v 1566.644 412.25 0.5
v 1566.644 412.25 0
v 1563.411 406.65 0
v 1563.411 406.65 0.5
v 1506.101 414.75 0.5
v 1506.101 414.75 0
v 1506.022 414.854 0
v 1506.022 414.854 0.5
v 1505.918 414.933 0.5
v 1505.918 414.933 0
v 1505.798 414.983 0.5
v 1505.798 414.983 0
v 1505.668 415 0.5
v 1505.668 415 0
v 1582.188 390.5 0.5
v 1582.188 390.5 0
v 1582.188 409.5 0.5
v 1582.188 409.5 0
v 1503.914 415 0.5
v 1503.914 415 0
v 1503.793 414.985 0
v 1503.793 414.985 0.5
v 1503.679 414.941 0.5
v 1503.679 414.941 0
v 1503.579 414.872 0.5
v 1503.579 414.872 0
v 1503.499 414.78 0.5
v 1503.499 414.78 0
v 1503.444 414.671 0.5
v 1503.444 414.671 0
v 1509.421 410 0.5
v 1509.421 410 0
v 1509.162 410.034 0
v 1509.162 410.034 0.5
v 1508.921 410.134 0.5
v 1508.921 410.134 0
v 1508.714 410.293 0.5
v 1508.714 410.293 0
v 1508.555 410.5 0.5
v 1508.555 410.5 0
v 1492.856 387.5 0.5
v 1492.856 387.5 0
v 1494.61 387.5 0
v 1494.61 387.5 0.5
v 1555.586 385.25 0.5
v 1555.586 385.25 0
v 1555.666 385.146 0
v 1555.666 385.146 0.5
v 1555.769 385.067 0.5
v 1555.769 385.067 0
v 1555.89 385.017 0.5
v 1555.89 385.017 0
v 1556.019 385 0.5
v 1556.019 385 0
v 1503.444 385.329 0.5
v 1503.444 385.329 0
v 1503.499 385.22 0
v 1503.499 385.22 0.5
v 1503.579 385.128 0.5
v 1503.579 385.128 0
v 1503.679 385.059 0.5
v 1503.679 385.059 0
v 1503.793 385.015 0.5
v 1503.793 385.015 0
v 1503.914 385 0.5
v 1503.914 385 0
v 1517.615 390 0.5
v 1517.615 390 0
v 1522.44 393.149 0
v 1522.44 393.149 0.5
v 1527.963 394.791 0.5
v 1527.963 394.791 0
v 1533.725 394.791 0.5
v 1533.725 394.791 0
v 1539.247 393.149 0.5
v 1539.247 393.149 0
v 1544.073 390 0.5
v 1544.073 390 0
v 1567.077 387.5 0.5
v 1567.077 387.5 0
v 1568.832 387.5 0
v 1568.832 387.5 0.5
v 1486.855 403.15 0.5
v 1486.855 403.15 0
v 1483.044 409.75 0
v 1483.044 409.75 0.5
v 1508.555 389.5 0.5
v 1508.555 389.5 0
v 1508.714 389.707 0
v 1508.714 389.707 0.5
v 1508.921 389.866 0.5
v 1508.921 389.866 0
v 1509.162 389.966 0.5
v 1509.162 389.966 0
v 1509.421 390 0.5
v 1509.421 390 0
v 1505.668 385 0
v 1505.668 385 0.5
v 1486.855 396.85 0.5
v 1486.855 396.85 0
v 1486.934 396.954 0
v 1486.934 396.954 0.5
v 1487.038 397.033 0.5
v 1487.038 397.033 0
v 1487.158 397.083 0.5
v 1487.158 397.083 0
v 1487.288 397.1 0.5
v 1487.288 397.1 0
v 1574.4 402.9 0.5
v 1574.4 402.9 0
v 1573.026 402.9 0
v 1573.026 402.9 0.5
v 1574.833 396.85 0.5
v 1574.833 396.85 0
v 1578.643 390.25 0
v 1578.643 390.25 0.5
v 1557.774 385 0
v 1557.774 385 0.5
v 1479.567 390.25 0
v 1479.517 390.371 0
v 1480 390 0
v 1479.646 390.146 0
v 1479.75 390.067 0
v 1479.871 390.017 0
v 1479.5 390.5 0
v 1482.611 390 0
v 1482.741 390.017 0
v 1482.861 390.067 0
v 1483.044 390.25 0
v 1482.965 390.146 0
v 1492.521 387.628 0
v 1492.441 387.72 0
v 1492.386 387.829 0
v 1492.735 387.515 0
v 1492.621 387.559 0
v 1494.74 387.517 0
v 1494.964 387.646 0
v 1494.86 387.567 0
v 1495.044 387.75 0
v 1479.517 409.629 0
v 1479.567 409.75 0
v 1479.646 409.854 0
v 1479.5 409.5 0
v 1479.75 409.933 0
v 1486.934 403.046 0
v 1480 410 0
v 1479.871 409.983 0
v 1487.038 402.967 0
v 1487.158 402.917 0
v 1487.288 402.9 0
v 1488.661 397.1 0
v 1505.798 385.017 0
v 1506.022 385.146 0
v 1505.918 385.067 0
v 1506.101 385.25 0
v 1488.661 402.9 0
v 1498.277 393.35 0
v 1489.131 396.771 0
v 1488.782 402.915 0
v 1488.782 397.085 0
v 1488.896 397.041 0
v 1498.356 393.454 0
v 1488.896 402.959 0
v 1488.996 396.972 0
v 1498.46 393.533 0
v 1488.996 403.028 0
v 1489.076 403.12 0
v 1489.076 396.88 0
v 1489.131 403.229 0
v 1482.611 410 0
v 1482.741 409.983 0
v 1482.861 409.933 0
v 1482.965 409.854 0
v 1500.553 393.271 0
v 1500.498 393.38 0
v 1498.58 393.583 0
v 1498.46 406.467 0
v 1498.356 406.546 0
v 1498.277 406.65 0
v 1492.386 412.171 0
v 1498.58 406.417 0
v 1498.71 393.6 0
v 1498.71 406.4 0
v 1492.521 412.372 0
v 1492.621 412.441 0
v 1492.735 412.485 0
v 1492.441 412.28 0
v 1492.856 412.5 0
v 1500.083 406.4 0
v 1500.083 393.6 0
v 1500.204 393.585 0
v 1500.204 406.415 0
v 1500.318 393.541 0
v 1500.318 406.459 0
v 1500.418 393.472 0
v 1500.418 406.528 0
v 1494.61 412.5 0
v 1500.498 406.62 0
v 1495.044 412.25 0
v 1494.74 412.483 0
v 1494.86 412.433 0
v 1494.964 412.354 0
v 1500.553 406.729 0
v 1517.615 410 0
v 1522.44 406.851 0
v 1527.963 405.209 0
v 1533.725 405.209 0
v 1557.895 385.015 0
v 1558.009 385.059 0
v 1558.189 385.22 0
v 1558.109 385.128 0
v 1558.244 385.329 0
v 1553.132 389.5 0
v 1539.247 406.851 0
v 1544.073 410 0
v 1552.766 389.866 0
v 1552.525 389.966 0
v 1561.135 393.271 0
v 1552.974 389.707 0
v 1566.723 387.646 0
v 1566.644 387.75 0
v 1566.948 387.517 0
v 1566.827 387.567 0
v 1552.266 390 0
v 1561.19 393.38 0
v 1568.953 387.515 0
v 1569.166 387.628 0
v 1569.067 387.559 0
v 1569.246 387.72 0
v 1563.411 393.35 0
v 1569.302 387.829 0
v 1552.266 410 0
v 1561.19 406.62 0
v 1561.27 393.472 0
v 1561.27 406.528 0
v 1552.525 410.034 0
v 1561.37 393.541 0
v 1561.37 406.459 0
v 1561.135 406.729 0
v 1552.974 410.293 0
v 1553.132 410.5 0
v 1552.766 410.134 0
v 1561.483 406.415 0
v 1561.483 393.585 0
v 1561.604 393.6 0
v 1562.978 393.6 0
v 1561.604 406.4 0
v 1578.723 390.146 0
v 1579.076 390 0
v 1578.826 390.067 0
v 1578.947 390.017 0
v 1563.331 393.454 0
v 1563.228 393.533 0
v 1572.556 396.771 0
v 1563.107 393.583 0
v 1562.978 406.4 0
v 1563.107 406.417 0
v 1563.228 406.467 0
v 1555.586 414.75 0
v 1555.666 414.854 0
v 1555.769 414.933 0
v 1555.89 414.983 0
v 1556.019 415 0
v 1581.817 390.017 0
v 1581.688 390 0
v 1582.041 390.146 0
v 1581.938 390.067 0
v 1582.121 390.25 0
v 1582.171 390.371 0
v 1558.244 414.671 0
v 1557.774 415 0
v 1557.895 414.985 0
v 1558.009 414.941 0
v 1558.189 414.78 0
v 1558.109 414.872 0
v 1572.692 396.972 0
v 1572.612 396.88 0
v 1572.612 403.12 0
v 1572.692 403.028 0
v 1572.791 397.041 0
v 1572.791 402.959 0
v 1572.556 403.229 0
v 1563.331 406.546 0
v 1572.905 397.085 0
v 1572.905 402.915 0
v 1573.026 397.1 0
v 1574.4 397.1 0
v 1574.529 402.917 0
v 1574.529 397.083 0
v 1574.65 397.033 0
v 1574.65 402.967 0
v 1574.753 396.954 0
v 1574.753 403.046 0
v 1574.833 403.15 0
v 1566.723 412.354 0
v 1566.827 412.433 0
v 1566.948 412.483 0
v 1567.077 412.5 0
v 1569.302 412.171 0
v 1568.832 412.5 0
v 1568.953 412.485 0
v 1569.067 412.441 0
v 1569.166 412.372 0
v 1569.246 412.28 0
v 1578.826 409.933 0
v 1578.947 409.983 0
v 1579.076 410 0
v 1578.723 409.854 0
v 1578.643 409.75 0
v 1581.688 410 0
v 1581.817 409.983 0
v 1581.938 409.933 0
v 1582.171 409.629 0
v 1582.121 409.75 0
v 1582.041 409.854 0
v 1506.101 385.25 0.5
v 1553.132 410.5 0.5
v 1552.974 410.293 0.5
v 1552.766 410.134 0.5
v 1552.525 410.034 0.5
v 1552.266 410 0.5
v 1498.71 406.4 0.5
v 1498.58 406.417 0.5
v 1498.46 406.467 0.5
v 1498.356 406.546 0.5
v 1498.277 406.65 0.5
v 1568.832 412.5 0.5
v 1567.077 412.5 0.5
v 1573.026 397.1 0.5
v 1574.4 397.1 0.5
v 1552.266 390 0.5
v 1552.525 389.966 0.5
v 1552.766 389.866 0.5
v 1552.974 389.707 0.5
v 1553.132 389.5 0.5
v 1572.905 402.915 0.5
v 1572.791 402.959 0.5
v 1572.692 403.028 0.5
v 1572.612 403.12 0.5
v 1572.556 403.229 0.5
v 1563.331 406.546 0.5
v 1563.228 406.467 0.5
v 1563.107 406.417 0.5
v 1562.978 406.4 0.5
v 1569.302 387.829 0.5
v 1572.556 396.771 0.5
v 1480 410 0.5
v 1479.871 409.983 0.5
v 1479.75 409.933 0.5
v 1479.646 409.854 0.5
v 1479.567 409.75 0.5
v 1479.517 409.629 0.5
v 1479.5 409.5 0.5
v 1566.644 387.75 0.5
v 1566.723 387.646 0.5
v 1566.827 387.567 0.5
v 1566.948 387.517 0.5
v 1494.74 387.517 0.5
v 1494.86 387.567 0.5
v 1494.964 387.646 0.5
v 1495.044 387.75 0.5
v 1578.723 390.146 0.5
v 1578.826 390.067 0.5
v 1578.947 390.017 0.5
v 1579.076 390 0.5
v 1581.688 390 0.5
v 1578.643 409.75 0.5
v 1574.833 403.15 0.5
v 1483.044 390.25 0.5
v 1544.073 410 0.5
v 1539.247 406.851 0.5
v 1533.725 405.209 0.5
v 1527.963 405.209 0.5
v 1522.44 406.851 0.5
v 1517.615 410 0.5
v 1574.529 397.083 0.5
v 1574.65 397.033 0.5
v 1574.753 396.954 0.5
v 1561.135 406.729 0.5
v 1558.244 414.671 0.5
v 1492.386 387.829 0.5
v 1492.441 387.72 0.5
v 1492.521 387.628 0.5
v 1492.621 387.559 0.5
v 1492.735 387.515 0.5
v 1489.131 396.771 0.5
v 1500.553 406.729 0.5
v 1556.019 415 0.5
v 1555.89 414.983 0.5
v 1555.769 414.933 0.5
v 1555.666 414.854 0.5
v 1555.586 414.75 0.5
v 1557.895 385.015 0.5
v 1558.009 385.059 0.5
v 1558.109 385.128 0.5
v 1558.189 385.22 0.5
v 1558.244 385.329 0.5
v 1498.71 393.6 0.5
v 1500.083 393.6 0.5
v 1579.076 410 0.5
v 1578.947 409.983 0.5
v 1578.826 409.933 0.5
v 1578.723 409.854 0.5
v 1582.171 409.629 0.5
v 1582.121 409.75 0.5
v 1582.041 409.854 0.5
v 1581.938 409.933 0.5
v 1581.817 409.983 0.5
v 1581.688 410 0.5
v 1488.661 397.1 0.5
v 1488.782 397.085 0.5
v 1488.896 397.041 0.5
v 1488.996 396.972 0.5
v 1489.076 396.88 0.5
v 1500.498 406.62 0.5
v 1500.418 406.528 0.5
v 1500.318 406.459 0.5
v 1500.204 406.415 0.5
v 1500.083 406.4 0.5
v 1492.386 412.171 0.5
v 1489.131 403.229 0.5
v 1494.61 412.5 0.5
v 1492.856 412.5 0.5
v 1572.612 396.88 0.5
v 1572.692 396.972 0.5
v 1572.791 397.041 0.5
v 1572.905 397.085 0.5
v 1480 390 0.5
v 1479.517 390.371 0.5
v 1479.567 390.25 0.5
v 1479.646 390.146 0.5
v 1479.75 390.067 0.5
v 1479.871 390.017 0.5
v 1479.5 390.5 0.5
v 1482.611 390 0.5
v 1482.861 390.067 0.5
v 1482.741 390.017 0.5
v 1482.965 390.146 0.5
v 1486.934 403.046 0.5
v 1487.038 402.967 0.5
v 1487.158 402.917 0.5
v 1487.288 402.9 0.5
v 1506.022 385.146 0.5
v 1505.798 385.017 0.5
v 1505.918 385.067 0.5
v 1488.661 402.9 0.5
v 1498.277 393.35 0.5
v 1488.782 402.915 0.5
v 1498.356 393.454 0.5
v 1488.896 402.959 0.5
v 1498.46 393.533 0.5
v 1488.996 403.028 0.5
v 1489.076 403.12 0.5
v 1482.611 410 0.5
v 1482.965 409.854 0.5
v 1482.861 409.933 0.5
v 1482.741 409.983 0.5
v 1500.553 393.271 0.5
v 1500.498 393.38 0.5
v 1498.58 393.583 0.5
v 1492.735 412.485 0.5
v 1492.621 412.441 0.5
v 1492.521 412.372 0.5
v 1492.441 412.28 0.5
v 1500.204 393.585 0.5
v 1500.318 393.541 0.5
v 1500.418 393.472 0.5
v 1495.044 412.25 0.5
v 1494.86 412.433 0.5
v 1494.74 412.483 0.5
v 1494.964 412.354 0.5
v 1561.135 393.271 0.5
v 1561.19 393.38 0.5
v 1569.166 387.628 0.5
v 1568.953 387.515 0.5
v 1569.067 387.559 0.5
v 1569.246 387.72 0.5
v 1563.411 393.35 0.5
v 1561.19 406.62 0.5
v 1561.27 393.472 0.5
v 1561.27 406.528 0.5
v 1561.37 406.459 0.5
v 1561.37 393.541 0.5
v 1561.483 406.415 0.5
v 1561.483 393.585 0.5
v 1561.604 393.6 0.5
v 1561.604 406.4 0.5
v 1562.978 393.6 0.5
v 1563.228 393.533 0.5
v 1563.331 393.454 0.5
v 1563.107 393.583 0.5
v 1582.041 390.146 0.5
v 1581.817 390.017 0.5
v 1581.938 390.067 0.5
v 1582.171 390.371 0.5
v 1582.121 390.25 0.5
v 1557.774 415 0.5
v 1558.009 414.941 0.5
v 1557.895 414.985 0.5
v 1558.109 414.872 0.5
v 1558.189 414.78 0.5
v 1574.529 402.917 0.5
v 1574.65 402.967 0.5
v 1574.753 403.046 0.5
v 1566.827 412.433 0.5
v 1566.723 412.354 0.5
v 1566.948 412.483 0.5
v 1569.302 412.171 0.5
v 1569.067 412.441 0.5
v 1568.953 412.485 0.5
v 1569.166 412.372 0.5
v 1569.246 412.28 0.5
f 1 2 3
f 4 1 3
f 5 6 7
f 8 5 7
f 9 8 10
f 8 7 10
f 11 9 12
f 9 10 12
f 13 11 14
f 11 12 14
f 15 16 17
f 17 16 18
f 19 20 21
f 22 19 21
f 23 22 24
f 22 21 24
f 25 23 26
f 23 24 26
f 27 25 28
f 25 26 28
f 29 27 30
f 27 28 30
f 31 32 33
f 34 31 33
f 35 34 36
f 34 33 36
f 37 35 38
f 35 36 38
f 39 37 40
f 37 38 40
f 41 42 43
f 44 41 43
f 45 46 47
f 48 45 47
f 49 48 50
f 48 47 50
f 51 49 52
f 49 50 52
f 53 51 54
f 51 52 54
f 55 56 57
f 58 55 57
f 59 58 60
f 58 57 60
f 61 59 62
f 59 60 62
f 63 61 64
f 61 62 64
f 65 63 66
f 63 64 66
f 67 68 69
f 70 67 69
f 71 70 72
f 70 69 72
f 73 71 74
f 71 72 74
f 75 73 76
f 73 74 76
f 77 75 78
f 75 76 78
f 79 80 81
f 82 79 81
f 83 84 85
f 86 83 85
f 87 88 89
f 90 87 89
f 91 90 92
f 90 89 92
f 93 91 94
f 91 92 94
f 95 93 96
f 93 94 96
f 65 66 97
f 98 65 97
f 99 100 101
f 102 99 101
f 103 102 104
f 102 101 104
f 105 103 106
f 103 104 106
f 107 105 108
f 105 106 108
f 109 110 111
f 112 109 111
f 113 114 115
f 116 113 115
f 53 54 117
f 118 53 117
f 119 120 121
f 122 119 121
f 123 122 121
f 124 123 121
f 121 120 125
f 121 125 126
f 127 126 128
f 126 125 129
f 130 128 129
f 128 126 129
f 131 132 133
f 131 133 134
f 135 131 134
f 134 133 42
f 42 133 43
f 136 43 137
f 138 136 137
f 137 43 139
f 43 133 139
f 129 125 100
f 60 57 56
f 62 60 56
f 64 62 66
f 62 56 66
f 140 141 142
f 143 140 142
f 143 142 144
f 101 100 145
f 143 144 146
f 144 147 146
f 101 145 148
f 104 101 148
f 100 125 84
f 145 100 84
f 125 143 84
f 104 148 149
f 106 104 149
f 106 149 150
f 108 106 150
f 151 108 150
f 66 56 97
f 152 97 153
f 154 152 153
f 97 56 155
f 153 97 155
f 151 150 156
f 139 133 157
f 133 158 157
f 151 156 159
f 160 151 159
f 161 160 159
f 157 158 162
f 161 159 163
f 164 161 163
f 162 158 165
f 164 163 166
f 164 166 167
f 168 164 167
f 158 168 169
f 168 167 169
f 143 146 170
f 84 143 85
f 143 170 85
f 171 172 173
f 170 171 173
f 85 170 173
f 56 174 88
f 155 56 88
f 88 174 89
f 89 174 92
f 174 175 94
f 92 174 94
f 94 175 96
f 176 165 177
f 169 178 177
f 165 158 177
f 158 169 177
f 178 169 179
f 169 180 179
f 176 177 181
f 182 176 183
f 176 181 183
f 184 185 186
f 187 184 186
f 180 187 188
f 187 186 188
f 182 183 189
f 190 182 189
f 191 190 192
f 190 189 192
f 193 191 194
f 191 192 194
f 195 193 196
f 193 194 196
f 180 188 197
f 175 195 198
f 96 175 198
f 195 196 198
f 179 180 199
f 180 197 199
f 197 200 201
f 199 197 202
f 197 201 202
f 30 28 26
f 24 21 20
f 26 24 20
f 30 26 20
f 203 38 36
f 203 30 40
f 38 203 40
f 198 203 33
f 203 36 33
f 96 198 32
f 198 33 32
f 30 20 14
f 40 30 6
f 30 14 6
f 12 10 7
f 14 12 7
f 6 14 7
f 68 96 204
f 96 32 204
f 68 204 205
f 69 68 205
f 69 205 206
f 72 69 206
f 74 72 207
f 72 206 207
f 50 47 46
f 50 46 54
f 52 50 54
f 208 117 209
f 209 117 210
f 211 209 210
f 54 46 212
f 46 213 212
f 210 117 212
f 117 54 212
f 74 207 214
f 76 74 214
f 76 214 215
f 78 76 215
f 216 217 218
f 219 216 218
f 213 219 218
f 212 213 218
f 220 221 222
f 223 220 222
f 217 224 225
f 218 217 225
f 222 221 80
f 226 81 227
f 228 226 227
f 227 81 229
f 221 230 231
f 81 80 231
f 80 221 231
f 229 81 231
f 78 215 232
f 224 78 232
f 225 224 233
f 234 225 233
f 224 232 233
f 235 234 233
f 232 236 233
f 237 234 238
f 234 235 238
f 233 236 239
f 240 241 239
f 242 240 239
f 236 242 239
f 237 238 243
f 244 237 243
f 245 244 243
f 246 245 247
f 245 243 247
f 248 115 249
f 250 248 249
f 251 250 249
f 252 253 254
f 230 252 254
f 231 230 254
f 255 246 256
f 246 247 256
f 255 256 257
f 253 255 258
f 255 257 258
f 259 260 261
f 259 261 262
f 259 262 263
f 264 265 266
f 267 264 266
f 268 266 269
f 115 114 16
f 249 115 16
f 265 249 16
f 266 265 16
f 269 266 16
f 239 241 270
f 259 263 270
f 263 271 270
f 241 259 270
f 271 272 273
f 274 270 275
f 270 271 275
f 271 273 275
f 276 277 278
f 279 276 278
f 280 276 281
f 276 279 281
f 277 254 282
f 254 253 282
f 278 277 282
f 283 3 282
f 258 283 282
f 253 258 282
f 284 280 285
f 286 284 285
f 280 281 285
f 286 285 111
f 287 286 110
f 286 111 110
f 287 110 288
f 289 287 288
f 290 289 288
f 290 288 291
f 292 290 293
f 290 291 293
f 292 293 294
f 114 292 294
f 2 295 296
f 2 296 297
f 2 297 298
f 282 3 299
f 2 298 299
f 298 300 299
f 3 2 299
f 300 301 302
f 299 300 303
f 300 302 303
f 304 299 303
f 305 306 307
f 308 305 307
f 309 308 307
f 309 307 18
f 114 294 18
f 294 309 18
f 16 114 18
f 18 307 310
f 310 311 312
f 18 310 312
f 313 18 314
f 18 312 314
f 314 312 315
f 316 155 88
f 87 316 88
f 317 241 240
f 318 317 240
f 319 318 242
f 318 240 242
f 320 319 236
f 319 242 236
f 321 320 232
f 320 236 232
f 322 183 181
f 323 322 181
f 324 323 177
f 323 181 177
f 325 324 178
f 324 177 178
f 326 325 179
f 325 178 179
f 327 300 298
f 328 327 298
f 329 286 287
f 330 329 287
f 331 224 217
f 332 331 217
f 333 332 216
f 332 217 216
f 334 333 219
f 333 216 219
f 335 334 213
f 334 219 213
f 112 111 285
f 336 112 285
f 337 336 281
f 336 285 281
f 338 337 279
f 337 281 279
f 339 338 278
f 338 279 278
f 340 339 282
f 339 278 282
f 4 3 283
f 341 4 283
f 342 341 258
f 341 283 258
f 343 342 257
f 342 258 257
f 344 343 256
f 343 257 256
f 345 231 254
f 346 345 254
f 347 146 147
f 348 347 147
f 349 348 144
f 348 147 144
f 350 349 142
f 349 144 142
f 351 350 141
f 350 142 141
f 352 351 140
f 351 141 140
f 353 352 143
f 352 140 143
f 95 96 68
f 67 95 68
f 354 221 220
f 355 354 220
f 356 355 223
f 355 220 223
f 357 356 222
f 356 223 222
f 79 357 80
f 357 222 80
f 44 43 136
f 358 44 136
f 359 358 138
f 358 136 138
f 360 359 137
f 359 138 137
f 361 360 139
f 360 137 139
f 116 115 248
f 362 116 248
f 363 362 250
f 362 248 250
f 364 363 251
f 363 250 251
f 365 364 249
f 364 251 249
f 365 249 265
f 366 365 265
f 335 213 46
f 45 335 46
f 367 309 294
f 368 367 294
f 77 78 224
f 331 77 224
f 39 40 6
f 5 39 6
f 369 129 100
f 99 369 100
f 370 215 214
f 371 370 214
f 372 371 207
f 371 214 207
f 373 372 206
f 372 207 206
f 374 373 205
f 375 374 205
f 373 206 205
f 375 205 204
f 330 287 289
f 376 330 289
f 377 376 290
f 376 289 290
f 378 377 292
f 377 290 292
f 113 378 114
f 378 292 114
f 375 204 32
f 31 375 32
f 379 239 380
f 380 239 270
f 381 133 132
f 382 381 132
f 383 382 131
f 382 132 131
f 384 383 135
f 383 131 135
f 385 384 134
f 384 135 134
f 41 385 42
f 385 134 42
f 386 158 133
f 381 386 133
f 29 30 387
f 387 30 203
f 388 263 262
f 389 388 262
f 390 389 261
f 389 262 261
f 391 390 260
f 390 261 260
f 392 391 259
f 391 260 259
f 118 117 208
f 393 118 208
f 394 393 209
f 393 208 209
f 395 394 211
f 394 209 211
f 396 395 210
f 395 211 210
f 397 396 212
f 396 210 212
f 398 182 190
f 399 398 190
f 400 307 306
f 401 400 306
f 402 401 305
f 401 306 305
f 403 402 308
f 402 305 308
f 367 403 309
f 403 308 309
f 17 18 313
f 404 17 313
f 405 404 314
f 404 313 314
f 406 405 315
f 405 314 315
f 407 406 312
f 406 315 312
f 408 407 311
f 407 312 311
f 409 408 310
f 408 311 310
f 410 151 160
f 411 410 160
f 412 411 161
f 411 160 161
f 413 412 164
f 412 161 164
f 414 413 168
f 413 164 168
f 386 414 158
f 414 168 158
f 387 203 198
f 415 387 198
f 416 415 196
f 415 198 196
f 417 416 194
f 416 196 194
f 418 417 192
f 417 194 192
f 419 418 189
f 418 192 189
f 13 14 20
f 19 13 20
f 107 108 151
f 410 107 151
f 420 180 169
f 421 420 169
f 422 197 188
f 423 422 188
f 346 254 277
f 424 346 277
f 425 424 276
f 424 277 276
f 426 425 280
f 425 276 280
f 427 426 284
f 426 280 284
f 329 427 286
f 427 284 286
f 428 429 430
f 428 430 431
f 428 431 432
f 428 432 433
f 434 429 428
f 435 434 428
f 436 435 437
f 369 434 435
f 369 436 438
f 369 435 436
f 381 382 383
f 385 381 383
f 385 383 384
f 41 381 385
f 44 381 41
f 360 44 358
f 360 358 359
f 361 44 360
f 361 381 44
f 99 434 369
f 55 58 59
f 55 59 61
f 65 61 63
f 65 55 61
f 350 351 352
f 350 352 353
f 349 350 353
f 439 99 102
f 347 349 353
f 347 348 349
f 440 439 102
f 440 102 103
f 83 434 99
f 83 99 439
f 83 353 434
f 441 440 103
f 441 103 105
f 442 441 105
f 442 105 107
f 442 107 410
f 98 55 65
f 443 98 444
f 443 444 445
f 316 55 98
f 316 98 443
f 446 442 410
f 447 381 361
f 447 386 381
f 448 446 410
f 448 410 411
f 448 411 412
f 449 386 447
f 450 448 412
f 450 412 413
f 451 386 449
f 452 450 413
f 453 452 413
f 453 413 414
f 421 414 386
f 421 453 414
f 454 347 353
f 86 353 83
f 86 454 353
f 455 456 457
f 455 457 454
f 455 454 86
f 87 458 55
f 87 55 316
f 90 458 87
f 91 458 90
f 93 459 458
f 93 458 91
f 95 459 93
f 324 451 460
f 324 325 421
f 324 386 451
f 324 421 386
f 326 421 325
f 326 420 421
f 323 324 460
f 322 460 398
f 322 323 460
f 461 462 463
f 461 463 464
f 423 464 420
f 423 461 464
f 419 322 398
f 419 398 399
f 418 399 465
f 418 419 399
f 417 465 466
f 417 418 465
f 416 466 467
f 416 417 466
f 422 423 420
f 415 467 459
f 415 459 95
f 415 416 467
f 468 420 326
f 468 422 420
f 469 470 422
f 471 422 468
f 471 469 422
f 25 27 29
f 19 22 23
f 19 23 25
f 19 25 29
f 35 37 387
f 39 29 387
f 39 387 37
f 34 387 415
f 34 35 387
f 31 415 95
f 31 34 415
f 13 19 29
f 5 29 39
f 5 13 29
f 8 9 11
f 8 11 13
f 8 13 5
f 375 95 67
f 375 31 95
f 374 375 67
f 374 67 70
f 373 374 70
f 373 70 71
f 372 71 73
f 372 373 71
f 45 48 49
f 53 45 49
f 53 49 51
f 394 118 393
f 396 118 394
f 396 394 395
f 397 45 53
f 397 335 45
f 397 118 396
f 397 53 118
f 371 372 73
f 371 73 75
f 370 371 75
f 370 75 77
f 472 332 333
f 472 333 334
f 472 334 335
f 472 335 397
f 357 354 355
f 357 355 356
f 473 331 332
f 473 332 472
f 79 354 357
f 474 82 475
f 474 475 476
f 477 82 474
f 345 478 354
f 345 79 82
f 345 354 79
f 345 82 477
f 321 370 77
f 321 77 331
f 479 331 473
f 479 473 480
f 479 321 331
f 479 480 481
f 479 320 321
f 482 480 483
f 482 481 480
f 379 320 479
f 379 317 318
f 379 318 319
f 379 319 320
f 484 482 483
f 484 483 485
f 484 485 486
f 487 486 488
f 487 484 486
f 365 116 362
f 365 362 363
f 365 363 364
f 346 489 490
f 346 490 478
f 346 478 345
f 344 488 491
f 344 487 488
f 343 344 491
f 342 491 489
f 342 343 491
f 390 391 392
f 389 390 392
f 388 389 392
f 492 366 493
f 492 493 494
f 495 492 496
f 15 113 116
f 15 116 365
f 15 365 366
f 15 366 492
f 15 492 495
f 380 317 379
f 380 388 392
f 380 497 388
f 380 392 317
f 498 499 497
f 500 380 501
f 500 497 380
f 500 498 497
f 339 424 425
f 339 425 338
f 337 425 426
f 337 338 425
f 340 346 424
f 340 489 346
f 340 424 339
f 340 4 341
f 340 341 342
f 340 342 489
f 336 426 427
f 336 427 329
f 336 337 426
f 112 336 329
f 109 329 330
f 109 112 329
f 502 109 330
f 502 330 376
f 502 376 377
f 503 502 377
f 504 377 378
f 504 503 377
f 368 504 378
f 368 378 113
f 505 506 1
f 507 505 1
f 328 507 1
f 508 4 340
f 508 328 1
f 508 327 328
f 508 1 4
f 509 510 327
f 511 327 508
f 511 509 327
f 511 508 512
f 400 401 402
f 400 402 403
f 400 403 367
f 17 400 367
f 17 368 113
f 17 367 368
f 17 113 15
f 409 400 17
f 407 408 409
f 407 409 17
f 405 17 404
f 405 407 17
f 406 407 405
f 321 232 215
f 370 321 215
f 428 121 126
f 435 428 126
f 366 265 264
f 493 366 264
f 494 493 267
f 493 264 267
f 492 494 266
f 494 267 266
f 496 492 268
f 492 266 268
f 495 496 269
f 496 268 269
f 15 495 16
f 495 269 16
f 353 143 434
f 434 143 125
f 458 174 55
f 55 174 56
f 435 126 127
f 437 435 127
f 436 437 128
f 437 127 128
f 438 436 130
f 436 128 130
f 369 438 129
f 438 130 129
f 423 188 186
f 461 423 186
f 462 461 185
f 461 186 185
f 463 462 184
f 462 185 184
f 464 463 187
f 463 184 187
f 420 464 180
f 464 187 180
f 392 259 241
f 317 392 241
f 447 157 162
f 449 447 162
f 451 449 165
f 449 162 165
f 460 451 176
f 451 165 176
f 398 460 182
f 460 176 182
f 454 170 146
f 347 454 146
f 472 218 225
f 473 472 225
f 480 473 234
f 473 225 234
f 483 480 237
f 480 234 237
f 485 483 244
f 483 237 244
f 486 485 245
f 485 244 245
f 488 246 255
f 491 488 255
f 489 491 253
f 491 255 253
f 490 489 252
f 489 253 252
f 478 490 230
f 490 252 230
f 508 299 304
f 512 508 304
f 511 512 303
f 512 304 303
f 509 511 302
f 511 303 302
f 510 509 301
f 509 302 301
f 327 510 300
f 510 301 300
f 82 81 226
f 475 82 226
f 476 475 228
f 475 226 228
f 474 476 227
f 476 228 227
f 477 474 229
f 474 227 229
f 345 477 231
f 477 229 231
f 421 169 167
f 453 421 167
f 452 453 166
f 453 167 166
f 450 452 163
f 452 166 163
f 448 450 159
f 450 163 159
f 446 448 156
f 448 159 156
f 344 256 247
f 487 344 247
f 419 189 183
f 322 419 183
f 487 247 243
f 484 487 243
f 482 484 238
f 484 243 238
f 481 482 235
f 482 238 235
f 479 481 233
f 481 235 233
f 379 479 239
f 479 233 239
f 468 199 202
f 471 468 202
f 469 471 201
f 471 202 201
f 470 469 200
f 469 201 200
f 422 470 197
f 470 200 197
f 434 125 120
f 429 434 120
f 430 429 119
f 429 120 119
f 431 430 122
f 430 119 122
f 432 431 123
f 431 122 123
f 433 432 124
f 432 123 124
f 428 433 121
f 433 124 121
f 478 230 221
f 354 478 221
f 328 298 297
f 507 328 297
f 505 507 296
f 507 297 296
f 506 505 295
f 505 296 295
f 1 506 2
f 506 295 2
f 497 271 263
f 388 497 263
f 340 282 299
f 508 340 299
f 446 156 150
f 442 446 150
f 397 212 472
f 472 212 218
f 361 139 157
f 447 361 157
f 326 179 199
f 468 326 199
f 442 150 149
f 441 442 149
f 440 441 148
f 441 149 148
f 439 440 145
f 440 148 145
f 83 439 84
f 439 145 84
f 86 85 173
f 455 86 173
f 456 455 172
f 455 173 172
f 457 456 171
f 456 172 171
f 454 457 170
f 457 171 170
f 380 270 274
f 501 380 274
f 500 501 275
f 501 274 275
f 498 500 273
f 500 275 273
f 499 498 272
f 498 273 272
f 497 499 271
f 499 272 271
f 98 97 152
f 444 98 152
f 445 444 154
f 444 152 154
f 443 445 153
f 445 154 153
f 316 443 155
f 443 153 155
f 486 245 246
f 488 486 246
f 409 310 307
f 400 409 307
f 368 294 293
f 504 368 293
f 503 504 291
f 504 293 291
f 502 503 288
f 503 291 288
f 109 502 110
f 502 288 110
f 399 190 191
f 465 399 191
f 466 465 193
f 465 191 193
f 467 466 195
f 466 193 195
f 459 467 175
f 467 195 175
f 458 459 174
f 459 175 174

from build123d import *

# Parameters (mm, degrees)
BOSS_EXTRUDE1_DEPTH = 0.5


with BuildPart() as part:
    # Model → Boss-Extrude1 (new body)
    with BuildSketch(Plane.XY):
        with BuildLine():
            Line((1561.604350415, 393.6), (1562.977857238, 393.6))
            ThreePointArc((1562.977857238, 393.6), (1563.227857238, 393.533012702), (1563.41086994, 393.35))
            Line((1563.41086994, 393.35), (1566.644031447, 387.75))
            ThreePointArc((1566.644031447, 387.75), (1566.827044149, 387.566987298), (1567.077044149, 387.5))
            Line((1567.077044149, 387.5), (1568.831847468, 387.5))
            ThreePointArc((1568.831847468, 387.5), (1569.118635686, 387.590423978), (1569.301693779, 387.828989928))
            Line((1569.301693779, 387.828989928), (1572.556322945, 396.771010072))
            ThreePointArc((1572.556322945, 396.771010072), (1572.739381037, 397.009576022), (1573.026169255, 397.1))
            Line((1573.026169255, 397.1), (1574.399676079, 397.1))
            ThreePointArc((1574.399676079, 397.1), (1574.649676079, 397.033012702), (1574.83268878, 396.85))
            Line((1574.83268878, 396.85), (1578.643200557, 390.25))
            ThreePointArc((1578.643200557, 390.25), (1578.826213259, 390.066987298), (1579.076213259, 390))
            Line((1579.076213259, 390), (1581.687538124, 390))
            ThreePointArc((1581.687538124, 390), (1582.041091515, 390.146446609), (1582.187538124, 390.5))
            Line((1582.187538124, 390.5), (1582.187538124, 409.5))
            ThreePointArc((1582.187538124, 409.5), (1582.041091515, 409.853553391), (1581.687538124, 410))
            Line((1581.687538124, 410), (1579.076213259, 410))
            ThreePointArc((1579.076213259, 410), (1578.826213259, 409.933012702), (1578.643200557, 409.75))
            Line((1578.643200557, 409.75), (1574.83268878, 403.15))
            ThreePointArc((1574.83268878, 403.15), (1574.649676079, 402.966987298), (1574.399676079, 402.9))
            Line((1574.399676079, 402.9), (1573.026169255, 402.9))
            ThreePointArc((1573.026169255, 402.9), (1572.739381037, 402.990423978), (1572.556322945, 403.228989928))
            Line((1572.556322945, 403.228989928), (1569.301693779, 412.171010072))
            ThreePointArc((1569.301693779, 412.171010072), (1569.118635686, 412.409576022), (1568.831847468, 412.5))
            Line((1568.831847468, 412.5), (1567.077044149, 412.5))
            ThreePointArc((1567.077044149, 412.5), (1566.827044149, 412.433012702), (1566.644031447, 412.25))
            Line((1566.644031447, 412.25), (1563.41086994, 406.65))
            ThreePointArc((1563.41086994, 406.65), (1563.227857238, 406.466987298), (1562.977857238, 406.4))
            Line((1562.977857238, 406.4), (1561.604350415, 406.4))
            ThreePointArc((1561.604350415, 406.4), (1561.317562197, 406.490423978), (1561.134504104, 406.728989928))
            Line((1561.134504104, 406.728989928), (1558.243845172, 414.671010072))
            ThreePointArc((1558.243845172, 414.671010072), (1558.06078708, 414.909576022), (1557.773998862, 415))
            Line((1557.773998862, 415), (1556.019195543, 415))
            ThreePointArc((1556.019195543, 415), (1555.769195543, 414.933012702), (1555.586182841, 414.75))
            Line((1555.586182841, 414.75), (1553.132444197, 410.5))
            ThreePointArc((1553.132444197, 410.5), (1552.766418793, 410.133974596), (1552.266418793, 410))
            Line((1552.266418793, 410), (1544.072525617, 410))
            ThreePointArc((1544.072525617, 410), (1530.843769062, 405), (1517.615012507, 410))
            Line((1517.615012507, 410), (1509.421119331, 410))
            ThreePointArc((1509.421119331, 410), (1508.921119331, 410.133974596), (1508.555093928, 410.5))
            Line((1508.555093928, 410.5), (1506.101355284, 414.75))
            ThreePointArc((1506.101355284, 414.75), (1505.918342582, 414.933012702), (1505.668342582, 415))
            Line((1505.668342582, 415), (1503.913539263, 415))
            ThreePointArc((1503.913539263, 415), (1503.626751044, 414.909576022), (1503.443692952, 414.671010072))
            Line((1503.443692952, 414.671010072), (1500.55303402, 406.728989928))
            ThreePointArc((1500.55303402, 406.728989928), (1500.369975928, 406.490423978), (1500.08318771, 406.4))
            Line((1500.08318771, 406.4), (1498.709680887, 406.4))
            ThreePointArc((1498.709680887, 406.4), (1498.459680886, 406.466987298), (1498.276668185, 406.65))
            Line((1498.276668185, 406.65), (1495.043506677, 412.25))
            ThreePointArc((1495.043506677, 412.25), (1494.860493975, 412.433012702), (1494.610493975, 412.5))
            Line((1494.610493975, 412.5), (1492.855690656, 412.5))
            ThreePointArc((1492.855690656, 412.5), (1492.568902438, 412.409576022), (1492.385844346, 412.171010072))
            Line((1492.385844346, 412.171010072), (1489.131215179, 403.228989928))
            ThreePointArc((1489.131215179, 403.228989928), (1488.948157087, 402.990423978), (1488.661368869, 402.9))
            Line((1488.661368869, 402.9), (1487.287862046, 402.9))
            ThreePointArc((1487.287862046, 402.9), (1487.037862046, 402.966987298), (1486.854849344, 403.15))
            Line((1486.854849344, 403.15), (1483.044337567, 409.75))
            ThreePointArc((1483.044337567, 409.75), (1482.861324865, 409.933012702), (1482.611324865, 410))
            Line((1482.611324865, 410), (1480, 410))
            ThreePointArc((1480, 410), (1479.646446609, 409.853553391), (1479.5, 409.5))
            Line((1479.5, 409.5), (1479.5, 390.5))
            ThreePointArc((1479.5, 390.5), (1479.646446609, 390.146446609), (1480, 390))
            Line((1480, 390), (1482.611324865, 390))
            ThreePointArc((1482.611324865, 390), (1482.861324865, 390.066987298), (1483.044337567, 390.25))
            Line((1483.044337567, 390.25), (1486.854849344, 396.85))
            ThreePointArc((1486.854849344, 396.85), (1487.037862046, 397.033012702), (1487.287862046, 397.1))
            Line((1487.287862046, 397.1), (1488.661368869, 397.1))
            ThreePointArc((1488.661368869, 397.1), (1488.948157087, 397.009576022), (1489.131215179, 396.771010072))
            Line((1489.131215179, 396.771010072), (1492.385844346, 387.828989928))
            ThreePointArc((1492.385844346, 387.828989928), (1492.568902438, 387.590423978), (1492.855690656, 387.5))
            Line((1492.855690656, 387.5), (1494.610493975, 387.5))
            ThreePointArc((1494.610493975, 387.5), (1494.860493975, 387.566987298), (1495.043506677, 387.75))
            Line((1495.043506677, 387.75), (1498.276668185, 393.35))
            ThreePointArc((1498.276668185, 393.35), (1498.459680886, 393.533012702), (1498.709680887, 393.6))
            Line((1498.709680887, 393.6), (1500.08318771, 393.6))
            ThreePointArc((1500.08318771, 393.6), (1500.369975928, 393.509576022), (1500.55303402, 393.271010072))
            Line((1500.55303402, 393.271010072), (1503.443692952, 385.328989928))
            ThreePointArc((1503.443692952, 385.328989928), (1503.626751044, 385.090423978), (1503.913539263, 385))
            Line((1503.913539263, 385), (1505.668342582, 385))
            ThreePointArc((1505.668342582, 385), (1505.918342582, 385.066987298), (1506.101355283, 385.25))
            Line((1506.101355283, 385.25), (1508.555093928, 389.5))
            ThreePointArc((1508.555093928, 389.5), (1508.921119331, 389.866025404), (1509.421119331, 390))
            Line((1509.421119331, 390), (1517.615012507, 390))
            ThreePointArc((1517.615012507, 390), (1530.843769062, 395), (1544.072525618, 390))
            Line((1544.072525618, 390), (1552.266418793, 390))
            ThreePointArc((1552.266418793, 390), (1552.766418793, 389.866025404), (1553.132444197, 389.5))
            Line((1553.132444197, 389.5), (1555.586182841, 385.25))
            ThreePointArc((1555.586182841, 385.25), (1555.769195543, 385.066987298), (1556.019195543, 385))
            Line((1556.019195543, 385), (1557.773998862, 385))
            ThreePointArc((1557.773998862, 385), (1558.06078708, 385.090423978), (1558.243845172, 385.328989928))
            Line((1558.243845172, 385.328989928), (1561.134504104, 393.271010072))
            ThreePointArc((1561.134504104, 393.271010072), (1561.317562197, 393.509576022), (1561.604350415, 393.6))
        make_face()
    extrude(amount=BOSS_EXTRUDE1_DEPTH)


solid = part.part
